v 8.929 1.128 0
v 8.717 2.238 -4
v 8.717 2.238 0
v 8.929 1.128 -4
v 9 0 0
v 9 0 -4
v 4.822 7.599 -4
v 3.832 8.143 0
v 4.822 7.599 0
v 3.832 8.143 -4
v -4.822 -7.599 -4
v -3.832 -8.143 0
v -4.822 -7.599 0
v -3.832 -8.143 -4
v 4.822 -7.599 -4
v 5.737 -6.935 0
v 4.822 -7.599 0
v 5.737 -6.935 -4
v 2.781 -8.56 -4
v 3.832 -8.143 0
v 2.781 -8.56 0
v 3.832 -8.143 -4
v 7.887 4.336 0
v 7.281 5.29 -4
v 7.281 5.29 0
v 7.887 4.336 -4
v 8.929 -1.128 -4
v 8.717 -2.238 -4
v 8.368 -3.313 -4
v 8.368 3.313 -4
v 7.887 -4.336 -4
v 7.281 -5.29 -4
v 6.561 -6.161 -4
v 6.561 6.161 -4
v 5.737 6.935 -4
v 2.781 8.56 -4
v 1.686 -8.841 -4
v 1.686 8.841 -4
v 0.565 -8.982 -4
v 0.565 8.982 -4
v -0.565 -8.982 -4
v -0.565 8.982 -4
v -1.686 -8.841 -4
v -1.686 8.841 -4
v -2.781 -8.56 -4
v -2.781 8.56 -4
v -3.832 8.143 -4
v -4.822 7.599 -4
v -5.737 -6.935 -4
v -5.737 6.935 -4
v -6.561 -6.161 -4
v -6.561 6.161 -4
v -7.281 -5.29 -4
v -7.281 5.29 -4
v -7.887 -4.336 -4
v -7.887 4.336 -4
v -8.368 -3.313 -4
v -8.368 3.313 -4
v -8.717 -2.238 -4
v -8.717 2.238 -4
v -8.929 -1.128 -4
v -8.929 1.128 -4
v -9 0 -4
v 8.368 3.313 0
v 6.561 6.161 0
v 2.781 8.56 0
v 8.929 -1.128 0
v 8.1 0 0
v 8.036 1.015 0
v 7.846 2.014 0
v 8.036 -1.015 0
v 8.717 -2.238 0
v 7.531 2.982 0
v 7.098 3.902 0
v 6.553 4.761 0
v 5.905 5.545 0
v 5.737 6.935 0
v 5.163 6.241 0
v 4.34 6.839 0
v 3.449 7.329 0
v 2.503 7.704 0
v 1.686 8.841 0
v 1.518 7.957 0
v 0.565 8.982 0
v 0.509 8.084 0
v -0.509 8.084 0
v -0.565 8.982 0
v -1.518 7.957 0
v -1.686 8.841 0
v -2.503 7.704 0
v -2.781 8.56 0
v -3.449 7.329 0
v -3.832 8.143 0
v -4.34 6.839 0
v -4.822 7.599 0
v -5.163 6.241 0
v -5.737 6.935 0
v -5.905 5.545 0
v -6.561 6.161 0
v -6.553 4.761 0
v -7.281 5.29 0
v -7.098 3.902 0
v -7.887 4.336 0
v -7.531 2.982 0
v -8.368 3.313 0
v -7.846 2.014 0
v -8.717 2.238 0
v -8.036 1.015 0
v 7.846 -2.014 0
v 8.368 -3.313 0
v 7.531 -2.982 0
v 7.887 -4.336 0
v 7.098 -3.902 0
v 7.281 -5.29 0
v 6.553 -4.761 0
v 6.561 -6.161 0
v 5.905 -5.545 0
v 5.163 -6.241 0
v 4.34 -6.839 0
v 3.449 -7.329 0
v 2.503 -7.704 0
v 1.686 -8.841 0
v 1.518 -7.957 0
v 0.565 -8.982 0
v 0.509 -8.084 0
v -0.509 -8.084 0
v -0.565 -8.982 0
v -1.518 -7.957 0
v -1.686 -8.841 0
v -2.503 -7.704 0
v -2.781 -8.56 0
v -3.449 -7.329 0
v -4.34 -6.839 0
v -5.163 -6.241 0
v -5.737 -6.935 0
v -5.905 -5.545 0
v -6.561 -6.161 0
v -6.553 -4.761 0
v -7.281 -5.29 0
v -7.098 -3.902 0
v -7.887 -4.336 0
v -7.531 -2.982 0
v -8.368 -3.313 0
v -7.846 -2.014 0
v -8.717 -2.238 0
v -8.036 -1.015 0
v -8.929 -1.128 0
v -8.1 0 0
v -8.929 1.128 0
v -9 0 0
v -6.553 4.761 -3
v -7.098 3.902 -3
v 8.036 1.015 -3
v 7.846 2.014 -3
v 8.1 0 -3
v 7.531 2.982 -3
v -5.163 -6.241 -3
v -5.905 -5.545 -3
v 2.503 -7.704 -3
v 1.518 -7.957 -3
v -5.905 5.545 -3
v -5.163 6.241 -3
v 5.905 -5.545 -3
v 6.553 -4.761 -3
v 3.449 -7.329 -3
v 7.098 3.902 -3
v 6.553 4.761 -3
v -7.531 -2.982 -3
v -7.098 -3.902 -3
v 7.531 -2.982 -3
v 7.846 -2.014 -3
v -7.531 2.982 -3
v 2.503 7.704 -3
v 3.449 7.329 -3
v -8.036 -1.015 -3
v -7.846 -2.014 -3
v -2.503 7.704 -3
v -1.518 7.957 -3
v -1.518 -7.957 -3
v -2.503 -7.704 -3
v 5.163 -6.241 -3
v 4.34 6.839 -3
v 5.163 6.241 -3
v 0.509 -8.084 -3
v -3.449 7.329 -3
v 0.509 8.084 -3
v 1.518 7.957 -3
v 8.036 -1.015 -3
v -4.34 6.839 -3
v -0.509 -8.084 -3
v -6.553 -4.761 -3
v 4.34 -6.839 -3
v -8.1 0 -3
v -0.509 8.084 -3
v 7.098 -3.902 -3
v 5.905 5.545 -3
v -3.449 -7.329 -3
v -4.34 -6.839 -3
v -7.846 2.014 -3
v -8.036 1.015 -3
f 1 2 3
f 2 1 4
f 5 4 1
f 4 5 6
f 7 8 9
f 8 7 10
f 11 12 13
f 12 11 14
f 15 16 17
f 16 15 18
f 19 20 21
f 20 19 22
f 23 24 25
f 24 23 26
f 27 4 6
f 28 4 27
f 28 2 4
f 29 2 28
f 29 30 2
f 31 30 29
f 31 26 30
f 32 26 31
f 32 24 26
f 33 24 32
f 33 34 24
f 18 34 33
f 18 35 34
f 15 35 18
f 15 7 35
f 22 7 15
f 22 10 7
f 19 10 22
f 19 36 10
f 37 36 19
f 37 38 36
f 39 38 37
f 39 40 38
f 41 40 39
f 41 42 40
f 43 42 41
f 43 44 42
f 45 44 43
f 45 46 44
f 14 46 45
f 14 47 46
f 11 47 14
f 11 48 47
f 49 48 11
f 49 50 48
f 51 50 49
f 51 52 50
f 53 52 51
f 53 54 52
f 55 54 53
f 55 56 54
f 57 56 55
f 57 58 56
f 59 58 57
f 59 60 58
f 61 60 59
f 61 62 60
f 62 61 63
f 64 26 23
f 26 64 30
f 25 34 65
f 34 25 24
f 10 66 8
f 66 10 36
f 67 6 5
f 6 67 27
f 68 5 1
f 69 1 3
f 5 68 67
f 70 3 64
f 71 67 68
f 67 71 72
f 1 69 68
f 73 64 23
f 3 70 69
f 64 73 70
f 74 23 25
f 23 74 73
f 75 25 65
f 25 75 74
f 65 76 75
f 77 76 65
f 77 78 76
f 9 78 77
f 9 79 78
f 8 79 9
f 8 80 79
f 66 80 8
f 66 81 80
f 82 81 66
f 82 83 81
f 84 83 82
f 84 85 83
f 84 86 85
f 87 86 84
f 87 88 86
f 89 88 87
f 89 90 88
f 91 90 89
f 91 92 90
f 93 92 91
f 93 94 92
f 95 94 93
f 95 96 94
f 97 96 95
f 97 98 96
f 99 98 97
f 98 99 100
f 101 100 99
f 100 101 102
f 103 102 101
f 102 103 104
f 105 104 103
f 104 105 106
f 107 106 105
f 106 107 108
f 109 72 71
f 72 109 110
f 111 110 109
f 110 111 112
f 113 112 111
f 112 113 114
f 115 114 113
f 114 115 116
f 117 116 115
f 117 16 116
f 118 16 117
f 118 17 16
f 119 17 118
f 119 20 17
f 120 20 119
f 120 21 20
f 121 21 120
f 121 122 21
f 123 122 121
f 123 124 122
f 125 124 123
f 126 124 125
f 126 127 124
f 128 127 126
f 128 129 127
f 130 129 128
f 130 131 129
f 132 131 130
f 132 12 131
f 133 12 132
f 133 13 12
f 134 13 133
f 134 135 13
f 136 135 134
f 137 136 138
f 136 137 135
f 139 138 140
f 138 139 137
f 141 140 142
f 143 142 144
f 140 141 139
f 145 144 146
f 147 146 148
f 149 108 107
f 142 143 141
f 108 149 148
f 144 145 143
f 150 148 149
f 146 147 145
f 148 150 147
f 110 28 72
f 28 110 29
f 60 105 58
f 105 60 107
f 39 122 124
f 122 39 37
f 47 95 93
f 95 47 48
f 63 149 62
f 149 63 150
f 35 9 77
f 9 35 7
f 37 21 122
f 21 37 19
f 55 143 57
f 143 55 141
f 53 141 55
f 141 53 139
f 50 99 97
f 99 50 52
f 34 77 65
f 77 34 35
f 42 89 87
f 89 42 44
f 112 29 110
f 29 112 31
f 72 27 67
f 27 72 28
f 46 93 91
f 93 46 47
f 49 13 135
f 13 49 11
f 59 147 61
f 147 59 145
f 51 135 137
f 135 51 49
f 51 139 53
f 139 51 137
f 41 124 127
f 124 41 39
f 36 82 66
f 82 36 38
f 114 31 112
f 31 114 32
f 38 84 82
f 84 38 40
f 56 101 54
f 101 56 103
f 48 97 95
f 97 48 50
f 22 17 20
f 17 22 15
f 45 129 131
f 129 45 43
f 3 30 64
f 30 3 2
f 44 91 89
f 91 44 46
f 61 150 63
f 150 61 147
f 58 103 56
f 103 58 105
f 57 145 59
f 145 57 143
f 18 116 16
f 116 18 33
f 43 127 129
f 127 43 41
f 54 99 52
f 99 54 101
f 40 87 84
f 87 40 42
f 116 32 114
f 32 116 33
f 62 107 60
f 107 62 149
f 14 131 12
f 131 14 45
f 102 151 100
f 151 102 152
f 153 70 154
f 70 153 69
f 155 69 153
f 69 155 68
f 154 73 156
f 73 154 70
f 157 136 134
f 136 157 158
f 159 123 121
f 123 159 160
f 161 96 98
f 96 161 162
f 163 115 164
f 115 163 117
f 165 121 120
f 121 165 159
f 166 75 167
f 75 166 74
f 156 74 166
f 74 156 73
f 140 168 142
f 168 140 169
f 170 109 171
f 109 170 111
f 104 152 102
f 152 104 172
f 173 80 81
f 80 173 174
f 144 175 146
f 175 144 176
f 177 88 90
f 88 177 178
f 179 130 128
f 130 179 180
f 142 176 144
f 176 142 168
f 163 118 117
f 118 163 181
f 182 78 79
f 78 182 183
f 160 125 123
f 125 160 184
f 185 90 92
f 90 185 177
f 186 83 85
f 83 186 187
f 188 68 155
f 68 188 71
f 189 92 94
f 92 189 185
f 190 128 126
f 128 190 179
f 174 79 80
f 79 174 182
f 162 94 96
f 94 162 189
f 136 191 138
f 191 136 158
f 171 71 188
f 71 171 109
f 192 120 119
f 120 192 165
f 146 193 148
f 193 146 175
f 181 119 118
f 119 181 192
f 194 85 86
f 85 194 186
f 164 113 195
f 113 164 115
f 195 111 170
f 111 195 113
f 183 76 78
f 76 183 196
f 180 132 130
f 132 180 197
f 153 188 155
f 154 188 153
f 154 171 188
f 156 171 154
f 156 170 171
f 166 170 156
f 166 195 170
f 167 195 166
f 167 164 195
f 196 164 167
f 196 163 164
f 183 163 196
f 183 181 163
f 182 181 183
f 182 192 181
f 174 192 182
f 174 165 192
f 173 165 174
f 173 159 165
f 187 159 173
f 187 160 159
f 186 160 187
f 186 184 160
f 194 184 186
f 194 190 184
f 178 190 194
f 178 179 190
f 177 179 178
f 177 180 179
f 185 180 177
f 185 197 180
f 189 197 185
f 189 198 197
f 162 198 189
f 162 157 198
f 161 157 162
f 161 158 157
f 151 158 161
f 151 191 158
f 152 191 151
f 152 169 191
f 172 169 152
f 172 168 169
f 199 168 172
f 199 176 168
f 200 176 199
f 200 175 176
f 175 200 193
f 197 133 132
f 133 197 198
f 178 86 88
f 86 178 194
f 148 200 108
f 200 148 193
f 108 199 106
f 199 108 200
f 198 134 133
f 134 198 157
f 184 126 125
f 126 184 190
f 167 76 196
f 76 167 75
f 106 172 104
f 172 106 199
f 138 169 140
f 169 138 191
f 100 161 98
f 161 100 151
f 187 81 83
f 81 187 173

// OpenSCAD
$fn = 50;


difference() {
	union() {
		translate(v = [0, 0, -4.0000000000]) {
			cylinder(h = 4, r = 9.0000000000);
		}
	}
	union() {
		#translate(v = [0, 0, -3.0000000000]) {
			cylinder(h = 3, r = 8.1000000000);
		}
	}
}
